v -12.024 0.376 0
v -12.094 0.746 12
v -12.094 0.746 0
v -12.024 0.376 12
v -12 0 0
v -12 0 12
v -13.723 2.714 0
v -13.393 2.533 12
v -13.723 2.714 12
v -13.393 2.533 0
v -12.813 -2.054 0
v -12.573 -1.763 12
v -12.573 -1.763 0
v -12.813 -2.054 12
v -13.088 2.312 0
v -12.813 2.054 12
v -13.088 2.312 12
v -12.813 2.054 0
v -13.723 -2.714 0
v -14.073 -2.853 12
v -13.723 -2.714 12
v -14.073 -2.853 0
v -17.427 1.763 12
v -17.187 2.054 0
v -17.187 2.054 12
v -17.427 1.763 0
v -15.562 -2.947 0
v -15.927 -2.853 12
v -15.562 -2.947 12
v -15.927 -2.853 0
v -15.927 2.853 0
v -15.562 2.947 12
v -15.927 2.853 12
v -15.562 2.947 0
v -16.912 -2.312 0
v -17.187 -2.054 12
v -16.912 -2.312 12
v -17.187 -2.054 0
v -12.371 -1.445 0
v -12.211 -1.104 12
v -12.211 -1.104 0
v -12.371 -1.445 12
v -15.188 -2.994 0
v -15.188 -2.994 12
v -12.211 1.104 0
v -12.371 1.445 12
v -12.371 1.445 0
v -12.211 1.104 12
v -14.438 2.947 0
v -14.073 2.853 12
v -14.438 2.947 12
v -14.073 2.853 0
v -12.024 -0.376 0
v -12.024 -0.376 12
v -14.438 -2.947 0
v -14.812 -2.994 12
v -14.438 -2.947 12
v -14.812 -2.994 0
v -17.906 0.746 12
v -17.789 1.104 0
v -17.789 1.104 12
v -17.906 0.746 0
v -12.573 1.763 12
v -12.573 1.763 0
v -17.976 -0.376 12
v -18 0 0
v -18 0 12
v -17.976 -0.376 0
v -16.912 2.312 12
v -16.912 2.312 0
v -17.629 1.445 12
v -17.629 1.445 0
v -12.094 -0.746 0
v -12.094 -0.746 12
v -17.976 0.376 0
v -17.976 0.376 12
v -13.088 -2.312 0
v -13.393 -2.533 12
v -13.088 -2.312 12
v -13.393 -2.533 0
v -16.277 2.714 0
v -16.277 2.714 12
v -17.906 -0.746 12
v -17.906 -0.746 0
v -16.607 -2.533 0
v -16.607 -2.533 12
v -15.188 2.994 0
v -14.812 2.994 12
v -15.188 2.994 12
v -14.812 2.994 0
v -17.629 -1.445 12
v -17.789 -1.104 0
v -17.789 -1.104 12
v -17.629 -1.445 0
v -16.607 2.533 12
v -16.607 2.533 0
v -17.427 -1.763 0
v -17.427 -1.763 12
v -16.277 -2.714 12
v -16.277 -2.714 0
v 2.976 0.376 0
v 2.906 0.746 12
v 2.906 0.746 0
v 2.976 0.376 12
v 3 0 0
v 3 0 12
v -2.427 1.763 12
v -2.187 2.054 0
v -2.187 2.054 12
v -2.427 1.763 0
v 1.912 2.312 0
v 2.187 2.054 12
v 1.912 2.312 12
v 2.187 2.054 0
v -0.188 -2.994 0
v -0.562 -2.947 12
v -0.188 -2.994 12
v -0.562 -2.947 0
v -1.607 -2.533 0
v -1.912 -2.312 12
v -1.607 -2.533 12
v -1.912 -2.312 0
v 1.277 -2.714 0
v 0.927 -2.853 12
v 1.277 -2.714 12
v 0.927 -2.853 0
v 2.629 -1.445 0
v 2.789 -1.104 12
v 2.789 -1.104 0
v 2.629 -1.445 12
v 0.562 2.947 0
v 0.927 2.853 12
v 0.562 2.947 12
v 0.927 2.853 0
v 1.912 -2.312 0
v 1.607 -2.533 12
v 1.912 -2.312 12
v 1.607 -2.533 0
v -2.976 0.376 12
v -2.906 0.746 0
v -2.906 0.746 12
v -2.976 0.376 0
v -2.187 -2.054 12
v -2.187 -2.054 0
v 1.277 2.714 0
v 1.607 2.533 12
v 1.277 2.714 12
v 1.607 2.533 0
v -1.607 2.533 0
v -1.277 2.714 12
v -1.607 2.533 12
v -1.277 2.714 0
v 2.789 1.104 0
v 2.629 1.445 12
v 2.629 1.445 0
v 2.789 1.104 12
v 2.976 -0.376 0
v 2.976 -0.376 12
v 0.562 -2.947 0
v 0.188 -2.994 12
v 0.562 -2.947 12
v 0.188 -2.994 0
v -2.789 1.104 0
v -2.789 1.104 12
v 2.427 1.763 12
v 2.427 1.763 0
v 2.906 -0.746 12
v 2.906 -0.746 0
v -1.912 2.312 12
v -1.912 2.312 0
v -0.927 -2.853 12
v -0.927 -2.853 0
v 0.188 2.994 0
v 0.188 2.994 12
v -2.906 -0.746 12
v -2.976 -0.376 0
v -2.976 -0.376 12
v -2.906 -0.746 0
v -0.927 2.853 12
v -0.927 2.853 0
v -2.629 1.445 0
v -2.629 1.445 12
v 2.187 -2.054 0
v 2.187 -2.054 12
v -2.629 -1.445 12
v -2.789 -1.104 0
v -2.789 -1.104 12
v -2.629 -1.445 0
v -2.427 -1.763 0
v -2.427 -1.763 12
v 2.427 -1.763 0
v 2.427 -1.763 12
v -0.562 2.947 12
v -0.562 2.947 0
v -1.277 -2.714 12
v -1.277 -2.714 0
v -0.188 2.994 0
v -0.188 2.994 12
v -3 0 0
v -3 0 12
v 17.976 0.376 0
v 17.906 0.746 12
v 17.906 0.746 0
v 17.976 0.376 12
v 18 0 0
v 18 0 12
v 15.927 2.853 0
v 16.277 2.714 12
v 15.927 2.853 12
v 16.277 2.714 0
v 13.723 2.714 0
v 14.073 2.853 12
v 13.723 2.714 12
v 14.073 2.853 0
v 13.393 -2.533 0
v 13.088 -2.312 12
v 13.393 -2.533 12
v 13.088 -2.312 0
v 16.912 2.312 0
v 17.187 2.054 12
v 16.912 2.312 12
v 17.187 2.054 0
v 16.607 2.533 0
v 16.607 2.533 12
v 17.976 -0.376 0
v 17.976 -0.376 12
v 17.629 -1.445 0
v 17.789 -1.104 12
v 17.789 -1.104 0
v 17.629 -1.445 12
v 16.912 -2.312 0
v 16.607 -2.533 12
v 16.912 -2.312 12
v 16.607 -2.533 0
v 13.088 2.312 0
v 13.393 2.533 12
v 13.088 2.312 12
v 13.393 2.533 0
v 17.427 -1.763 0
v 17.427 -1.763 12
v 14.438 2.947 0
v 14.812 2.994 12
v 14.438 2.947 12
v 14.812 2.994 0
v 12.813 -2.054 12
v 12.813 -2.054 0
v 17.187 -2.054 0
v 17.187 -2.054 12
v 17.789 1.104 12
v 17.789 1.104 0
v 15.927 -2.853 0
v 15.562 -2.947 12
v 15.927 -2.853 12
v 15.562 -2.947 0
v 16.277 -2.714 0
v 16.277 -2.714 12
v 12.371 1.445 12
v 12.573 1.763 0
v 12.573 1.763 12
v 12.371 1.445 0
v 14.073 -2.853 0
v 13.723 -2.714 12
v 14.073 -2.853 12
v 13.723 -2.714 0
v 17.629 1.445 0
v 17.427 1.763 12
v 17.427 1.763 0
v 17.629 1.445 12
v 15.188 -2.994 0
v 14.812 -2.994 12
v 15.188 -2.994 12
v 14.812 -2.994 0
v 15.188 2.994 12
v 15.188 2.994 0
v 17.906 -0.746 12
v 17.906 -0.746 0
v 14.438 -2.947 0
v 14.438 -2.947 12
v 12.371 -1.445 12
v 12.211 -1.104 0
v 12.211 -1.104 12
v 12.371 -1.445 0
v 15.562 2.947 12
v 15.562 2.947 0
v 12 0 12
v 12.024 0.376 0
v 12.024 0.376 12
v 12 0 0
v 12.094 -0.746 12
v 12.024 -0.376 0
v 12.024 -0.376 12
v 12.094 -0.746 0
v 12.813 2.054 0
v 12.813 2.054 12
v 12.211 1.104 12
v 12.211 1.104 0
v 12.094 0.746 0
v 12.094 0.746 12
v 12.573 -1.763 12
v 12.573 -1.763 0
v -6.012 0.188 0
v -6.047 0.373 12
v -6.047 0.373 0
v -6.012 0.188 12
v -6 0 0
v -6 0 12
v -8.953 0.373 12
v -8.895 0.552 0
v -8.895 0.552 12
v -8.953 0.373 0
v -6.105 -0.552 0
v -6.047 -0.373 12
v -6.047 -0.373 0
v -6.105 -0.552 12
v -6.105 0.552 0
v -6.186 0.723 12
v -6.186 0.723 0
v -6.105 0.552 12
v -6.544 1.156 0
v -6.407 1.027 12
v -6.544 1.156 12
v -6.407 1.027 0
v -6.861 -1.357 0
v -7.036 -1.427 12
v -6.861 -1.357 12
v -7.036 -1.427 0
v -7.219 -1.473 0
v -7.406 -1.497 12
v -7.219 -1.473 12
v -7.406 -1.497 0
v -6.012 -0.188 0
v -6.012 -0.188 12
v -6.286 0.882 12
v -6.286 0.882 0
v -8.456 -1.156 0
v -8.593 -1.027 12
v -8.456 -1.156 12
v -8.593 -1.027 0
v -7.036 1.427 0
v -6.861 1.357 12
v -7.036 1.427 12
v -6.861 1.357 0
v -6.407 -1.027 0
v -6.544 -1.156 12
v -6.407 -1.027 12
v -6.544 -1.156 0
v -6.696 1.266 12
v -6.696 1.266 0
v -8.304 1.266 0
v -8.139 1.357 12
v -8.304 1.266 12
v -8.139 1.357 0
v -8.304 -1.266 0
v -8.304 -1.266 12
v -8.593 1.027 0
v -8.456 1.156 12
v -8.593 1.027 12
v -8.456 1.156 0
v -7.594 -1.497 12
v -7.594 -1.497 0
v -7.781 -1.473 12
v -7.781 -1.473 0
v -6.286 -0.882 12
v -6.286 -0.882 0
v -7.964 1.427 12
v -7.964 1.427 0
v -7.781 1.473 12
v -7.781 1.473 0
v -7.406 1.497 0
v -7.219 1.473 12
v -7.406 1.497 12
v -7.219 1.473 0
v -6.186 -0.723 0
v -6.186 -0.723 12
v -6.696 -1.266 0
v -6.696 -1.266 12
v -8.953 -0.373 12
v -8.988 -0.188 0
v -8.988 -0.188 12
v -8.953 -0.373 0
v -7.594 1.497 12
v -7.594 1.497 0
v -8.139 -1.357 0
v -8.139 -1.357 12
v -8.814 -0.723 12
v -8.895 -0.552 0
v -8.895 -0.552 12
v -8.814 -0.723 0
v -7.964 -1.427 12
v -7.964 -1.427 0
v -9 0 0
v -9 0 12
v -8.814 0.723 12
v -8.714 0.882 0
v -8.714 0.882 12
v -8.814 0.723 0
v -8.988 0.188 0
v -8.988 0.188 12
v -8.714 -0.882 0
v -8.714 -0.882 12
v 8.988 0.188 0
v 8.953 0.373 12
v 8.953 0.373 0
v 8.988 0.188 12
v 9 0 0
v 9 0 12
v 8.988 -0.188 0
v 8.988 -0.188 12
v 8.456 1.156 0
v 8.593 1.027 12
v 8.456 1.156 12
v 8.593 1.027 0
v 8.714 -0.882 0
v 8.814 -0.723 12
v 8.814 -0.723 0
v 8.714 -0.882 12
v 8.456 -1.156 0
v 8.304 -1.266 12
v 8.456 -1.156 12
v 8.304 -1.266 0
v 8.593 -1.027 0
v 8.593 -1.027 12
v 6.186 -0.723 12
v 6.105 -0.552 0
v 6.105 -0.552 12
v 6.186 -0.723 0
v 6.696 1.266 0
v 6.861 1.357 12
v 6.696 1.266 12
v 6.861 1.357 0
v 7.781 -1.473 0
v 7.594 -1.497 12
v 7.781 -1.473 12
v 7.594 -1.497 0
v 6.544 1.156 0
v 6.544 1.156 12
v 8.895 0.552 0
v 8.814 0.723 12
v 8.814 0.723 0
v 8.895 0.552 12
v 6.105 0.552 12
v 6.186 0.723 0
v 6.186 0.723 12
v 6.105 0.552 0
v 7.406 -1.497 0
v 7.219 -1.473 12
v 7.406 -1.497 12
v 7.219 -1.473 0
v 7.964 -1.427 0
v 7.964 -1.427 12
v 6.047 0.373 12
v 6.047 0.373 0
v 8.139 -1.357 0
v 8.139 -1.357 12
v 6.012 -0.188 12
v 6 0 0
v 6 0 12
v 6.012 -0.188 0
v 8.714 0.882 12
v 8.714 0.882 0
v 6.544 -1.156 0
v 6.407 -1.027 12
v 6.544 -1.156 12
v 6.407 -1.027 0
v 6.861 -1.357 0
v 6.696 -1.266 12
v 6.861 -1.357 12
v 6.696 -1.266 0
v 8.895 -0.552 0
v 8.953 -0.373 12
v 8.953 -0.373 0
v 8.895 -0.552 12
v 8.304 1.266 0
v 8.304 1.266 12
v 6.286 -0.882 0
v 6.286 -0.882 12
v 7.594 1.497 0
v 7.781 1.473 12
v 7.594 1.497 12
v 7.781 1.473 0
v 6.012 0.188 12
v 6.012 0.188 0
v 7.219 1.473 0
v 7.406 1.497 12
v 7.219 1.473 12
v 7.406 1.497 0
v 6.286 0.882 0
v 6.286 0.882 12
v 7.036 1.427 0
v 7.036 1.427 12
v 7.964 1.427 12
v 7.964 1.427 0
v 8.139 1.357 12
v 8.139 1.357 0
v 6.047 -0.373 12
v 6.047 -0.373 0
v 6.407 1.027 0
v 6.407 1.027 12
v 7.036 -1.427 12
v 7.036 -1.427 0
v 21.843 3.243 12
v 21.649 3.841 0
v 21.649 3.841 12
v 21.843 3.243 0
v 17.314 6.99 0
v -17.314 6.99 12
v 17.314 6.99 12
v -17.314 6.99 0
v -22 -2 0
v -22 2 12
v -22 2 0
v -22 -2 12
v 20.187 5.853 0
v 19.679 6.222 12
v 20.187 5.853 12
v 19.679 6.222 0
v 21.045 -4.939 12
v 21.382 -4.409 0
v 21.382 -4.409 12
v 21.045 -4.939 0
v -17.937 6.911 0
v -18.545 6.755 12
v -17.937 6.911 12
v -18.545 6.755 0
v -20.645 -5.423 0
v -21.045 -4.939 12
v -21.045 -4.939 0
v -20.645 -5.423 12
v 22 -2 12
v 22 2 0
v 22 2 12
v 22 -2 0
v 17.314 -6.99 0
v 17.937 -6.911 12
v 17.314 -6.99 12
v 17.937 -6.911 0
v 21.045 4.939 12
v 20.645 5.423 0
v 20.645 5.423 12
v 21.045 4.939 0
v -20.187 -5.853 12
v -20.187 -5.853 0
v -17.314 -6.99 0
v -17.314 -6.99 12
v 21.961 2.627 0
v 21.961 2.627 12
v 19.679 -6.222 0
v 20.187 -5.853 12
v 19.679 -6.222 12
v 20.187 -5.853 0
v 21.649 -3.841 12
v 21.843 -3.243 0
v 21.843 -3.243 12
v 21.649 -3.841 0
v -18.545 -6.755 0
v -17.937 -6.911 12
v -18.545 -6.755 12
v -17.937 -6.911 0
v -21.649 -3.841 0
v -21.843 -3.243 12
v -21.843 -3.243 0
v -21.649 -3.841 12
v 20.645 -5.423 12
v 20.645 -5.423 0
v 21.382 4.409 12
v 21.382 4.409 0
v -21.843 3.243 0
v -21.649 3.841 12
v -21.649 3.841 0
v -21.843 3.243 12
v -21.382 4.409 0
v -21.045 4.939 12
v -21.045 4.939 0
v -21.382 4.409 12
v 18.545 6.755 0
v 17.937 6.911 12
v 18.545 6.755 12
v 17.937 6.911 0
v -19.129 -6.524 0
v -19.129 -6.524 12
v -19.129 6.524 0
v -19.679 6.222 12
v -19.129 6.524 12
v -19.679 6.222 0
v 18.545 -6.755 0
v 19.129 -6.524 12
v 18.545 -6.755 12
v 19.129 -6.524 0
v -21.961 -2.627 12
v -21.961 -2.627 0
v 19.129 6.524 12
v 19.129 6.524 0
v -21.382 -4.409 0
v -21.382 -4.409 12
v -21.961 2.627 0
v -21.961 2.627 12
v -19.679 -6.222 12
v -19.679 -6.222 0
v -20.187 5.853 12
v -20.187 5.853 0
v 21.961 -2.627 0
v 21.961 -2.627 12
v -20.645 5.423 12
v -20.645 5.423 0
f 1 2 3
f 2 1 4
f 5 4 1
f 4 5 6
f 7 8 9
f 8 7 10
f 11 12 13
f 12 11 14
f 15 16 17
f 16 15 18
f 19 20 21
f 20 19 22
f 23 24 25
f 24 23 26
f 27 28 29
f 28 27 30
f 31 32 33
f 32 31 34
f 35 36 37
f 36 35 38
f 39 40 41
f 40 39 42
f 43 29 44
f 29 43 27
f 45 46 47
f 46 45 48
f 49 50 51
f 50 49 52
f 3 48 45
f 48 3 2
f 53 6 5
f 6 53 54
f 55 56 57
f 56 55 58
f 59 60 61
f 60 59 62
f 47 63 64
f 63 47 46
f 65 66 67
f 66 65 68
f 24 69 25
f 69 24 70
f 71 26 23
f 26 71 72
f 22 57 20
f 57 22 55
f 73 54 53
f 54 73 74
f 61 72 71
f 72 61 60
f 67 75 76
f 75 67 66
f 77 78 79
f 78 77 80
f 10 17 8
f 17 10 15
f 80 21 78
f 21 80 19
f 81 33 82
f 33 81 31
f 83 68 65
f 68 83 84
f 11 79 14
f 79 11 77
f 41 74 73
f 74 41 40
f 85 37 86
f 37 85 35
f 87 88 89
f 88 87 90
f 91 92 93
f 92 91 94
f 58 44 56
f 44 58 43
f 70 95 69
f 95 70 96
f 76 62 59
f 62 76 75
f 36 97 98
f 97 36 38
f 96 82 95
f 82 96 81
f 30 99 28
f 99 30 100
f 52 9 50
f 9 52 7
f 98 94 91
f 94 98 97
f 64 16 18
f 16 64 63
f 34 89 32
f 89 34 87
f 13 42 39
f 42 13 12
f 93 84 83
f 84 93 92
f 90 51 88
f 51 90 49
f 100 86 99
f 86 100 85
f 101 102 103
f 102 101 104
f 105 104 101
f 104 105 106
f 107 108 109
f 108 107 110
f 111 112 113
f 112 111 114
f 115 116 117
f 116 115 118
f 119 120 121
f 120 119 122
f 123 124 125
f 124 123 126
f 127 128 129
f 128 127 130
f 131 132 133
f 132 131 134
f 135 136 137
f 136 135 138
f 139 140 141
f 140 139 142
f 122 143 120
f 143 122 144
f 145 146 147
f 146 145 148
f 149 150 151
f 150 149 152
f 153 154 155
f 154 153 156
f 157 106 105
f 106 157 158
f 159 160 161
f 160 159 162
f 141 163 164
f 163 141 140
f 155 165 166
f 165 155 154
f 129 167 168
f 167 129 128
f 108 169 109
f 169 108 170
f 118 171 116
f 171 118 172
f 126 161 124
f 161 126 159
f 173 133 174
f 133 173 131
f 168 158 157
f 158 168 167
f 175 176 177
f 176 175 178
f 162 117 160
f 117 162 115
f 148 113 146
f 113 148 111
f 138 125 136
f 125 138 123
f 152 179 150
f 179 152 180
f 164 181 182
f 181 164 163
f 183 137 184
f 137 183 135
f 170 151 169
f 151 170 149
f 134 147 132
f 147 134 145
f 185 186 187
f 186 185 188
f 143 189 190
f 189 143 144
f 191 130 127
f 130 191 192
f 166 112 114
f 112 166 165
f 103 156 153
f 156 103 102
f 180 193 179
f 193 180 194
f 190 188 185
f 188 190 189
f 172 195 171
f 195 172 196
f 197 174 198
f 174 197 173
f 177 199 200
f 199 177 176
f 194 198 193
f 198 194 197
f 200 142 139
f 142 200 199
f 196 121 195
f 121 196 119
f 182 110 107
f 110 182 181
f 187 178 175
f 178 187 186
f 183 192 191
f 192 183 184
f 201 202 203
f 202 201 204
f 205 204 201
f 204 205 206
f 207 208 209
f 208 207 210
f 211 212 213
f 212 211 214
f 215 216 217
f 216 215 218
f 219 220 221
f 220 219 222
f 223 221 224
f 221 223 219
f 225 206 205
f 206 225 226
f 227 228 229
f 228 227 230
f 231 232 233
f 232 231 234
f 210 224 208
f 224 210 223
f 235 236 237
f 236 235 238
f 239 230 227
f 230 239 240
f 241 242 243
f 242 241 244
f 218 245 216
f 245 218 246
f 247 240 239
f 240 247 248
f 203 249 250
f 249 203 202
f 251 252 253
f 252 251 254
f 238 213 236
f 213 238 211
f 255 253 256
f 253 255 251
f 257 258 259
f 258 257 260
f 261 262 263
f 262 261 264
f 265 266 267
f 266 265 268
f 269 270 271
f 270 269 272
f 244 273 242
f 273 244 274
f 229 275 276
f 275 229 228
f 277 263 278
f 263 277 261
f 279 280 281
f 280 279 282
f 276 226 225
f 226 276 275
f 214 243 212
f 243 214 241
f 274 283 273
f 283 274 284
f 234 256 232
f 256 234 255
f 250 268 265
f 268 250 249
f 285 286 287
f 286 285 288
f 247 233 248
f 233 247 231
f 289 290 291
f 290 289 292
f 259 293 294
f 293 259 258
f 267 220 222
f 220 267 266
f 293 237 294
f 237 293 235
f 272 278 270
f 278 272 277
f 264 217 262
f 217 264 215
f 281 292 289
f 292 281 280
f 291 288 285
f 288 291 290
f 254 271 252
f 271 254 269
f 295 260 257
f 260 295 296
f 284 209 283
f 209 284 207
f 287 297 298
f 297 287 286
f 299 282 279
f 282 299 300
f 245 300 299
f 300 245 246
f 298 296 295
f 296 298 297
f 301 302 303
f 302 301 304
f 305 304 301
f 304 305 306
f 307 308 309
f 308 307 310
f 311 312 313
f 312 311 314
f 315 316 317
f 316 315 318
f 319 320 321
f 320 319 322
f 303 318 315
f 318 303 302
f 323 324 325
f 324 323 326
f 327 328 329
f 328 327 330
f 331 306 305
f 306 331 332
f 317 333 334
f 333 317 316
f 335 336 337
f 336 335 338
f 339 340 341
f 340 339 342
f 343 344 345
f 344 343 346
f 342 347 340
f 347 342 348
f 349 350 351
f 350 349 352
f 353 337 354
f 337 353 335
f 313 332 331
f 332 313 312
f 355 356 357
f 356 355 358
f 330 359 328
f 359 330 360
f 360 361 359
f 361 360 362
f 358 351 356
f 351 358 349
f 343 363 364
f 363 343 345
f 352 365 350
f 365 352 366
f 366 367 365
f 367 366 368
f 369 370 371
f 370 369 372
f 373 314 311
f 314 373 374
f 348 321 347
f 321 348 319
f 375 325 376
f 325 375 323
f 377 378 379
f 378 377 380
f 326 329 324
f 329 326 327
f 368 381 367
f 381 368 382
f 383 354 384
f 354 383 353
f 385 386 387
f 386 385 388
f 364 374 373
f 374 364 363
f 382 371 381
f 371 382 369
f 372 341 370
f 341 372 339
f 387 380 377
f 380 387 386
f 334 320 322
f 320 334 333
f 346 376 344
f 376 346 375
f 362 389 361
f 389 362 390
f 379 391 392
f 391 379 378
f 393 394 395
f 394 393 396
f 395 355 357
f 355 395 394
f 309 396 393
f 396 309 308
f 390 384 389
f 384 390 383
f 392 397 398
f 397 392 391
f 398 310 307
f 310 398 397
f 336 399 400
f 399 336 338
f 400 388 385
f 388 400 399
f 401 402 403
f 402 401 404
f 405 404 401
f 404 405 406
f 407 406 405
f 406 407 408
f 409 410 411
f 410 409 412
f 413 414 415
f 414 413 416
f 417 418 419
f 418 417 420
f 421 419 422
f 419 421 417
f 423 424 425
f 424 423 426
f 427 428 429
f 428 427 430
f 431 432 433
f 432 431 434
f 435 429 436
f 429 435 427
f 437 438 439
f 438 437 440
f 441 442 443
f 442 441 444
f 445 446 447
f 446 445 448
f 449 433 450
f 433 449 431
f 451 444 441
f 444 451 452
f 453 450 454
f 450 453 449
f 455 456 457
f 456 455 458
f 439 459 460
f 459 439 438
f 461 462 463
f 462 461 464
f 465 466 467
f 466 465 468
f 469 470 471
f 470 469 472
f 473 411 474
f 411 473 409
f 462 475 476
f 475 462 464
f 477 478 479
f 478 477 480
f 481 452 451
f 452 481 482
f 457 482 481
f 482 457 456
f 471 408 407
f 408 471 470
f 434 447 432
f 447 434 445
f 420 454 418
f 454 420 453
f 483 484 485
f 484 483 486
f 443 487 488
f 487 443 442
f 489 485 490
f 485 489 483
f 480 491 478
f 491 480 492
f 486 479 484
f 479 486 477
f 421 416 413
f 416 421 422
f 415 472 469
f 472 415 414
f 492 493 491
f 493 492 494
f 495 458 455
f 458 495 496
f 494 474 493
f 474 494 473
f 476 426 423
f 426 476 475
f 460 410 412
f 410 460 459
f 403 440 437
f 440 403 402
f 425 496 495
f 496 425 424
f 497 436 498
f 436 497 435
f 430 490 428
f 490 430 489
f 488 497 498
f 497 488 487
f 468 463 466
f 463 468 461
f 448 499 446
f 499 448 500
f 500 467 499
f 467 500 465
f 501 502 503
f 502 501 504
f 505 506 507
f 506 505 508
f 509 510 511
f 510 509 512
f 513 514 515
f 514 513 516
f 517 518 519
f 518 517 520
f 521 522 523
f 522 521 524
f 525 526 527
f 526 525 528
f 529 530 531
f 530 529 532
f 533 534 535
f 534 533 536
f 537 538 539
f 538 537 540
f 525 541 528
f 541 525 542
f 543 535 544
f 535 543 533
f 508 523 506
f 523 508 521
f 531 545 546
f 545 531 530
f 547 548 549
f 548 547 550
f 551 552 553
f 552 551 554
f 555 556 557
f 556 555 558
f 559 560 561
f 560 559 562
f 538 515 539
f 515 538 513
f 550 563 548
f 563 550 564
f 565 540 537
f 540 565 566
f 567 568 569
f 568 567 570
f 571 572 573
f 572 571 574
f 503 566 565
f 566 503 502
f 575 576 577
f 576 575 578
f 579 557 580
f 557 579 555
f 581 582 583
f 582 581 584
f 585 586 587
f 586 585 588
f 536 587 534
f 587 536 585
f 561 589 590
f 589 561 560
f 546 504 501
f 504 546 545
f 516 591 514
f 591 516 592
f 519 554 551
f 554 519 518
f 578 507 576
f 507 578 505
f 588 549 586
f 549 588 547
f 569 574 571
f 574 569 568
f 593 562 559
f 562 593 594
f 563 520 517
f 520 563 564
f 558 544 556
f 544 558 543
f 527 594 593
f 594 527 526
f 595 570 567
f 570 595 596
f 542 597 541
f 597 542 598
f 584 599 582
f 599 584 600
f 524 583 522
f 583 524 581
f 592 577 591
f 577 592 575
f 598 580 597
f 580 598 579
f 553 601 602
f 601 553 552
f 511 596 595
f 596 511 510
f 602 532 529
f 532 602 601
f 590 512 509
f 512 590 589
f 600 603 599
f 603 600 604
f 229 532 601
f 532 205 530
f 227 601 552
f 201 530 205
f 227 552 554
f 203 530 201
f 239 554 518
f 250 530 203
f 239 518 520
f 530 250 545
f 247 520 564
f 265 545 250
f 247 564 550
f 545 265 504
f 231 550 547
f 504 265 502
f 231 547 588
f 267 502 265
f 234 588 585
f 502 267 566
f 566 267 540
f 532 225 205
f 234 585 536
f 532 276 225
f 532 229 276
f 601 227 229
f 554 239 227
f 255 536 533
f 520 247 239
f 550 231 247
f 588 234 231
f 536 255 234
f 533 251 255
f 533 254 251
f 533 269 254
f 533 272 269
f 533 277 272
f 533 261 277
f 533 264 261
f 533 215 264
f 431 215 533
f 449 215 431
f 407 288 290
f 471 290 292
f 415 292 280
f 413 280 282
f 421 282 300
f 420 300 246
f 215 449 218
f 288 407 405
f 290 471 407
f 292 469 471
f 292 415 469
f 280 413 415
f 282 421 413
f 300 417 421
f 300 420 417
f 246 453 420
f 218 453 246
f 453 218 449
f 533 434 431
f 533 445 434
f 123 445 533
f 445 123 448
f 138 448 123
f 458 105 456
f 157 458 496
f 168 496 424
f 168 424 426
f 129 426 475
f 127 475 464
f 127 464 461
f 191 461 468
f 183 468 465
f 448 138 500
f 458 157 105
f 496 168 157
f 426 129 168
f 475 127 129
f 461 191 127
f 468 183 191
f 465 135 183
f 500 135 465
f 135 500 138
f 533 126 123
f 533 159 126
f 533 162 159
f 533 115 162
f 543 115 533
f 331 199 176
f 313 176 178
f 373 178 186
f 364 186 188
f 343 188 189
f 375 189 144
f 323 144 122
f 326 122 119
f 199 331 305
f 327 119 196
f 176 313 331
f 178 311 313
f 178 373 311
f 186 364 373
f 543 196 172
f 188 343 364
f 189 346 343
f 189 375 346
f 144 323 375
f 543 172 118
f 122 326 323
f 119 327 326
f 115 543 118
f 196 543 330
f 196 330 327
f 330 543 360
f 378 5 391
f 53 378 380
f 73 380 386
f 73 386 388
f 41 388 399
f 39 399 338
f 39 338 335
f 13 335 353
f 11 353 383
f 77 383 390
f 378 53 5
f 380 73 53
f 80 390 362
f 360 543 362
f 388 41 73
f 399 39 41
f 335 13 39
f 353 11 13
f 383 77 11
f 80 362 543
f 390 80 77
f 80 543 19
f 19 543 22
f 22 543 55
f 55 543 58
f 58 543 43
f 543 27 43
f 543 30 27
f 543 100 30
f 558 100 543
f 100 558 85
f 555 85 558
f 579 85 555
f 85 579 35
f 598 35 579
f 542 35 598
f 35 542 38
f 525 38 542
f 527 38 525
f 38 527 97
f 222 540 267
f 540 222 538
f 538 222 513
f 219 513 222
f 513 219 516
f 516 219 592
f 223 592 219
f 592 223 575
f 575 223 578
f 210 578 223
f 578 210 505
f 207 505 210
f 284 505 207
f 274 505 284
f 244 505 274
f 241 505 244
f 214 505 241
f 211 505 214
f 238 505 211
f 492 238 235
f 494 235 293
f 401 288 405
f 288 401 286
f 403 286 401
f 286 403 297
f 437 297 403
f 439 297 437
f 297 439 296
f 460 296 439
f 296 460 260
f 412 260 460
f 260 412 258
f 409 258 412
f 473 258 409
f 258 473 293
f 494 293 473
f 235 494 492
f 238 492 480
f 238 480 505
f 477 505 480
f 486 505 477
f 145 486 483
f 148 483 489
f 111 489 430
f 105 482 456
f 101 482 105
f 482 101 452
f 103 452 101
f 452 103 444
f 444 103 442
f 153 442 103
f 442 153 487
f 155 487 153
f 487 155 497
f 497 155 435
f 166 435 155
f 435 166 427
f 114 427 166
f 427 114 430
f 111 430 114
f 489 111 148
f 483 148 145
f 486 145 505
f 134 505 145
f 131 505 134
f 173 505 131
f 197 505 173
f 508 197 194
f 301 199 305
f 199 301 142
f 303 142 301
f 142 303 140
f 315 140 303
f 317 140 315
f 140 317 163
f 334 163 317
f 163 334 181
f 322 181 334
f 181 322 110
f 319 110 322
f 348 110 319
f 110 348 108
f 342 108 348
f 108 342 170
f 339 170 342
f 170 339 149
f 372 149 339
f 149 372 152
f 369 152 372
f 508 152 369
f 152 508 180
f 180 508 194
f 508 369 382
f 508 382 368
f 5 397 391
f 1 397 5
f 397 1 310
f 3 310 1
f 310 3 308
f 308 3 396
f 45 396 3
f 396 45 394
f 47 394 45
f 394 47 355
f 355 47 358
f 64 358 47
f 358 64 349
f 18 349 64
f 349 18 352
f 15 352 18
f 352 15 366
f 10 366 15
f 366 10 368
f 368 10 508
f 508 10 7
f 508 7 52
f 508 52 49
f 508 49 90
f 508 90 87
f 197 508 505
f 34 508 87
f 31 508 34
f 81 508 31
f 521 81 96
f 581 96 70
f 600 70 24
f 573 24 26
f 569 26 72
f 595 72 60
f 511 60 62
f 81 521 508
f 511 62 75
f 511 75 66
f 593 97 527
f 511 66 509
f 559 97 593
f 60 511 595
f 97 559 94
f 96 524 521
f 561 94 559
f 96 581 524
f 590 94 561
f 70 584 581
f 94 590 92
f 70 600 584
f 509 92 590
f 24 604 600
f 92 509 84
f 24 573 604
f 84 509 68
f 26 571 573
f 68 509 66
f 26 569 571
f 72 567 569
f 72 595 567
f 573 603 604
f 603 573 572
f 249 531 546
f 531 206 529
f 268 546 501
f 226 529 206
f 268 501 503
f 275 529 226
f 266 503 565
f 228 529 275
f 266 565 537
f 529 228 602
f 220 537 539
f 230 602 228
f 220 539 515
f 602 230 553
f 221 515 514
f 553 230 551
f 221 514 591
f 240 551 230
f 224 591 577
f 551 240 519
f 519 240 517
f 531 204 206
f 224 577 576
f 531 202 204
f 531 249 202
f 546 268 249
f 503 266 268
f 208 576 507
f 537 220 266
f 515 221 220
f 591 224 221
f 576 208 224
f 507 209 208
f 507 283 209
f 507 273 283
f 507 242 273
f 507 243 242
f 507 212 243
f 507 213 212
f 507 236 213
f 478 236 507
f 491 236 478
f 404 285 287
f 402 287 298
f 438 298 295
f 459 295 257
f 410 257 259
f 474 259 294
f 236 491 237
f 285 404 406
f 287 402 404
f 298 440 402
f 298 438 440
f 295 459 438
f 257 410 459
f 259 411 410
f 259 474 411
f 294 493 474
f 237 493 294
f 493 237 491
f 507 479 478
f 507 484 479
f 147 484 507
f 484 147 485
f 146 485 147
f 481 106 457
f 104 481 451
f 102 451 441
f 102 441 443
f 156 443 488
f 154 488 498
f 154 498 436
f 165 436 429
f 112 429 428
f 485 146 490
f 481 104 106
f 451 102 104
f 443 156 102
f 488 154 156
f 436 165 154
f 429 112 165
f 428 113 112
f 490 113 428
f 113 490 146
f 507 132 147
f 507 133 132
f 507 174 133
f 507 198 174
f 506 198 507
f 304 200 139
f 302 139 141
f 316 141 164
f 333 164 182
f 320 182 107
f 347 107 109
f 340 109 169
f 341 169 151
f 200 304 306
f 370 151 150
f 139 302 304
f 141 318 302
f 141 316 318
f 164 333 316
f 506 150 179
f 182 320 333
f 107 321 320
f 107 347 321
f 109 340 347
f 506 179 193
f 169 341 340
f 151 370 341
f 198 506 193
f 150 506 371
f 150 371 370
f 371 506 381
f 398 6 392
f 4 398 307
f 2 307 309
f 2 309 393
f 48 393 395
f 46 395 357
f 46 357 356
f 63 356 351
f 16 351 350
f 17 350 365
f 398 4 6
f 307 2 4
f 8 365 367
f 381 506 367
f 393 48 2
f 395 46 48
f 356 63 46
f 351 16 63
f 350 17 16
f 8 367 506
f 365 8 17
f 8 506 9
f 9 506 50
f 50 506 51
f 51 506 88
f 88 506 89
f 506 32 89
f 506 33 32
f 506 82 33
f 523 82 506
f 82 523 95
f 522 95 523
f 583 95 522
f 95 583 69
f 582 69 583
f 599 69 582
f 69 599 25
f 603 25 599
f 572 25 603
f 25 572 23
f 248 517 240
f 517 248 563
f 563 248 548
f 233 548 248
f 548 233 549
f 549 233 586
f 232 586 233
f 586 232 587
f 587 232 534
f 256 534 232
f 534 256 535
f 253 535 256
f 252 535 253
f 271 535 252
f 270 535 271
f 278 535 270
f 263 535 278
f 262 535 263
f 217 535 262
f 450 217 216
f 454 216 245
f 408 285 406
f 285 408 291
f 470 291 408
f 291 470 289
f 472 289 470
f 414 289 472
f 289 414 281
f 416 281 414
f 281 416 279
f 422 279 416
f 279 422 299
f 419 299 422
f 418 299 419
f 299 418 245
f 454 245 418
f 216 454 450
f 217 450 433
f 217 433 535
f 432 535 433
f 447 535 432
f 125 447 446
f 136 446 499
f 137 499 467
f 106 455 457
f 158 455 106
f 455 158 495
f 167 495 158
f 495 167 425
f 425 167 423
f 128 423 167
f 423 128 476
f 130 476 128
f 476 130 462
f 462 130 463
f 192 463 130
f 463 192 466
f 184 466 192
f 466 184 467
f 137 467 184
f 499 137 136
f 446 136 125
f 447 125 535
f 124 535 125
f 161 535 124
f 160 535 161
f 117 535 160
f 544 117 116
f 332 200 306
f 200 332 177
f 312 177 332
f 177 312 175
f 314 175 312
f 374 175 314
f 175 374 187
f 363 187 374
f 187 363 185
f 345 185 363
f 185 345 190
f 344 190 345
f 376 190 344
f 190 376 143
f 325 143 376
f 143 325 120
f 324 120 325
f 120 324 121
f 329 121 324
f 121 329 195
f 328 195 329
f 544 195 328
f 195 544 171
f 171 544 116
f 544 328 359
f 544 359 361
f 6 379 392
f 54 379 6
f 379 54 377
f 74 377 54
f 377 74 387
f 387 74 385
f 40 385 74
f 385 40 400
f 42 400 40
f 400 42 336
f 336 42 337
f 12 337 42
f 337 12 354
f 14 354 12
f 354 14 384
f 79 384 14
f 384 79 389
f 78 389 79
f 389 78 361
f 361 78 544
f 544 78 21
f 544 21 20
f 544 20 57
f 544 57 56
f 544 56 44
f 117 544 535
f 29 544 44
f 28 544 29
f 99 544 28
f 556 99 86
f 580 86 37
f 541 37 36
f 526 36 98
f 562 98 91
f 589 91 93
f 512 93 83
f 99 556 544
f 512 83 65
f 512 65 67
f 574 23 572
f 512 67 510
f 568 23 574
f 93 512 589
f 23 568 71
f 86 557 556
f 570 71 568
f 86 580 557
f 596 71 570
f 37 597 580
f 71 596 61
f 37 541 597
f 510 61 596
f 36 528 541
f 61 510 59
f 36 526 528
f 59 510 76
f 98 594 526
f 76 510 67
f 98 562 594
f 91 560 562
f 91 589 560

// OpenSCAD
$fn = 50;


difference() {
	union() {
		hull() {
			translate(v = [-17.0000000000, 2.0000000000, 0]) {
				cylinder(h = 12, r = 5);
			}
			translate(v = [17.0000000000, 2.0000000000, 0]) {
				cylinder(h = 12, r = 5);
			}
			translate(v = [-17.0000000000, -2.0000000000, 0]) {
				cylinder(h = 12, r = 5);
			}
			translate(v = [17.0000000000, -2.0000000000, 0]) {
				cylinder(h = 12, r = 5);
			}
		}
	}
	union() {
		translate(v = [-15.0000000000, 0.0000000000, 0]) {
			translate(v = [0, 0, -100]) {
				cylinder(h = 200, r = 3.0000000000);
			}
		}
		translate(v = [0, 0, -100]) {
			cylinder(h = 200, r = 3.0000000000);
		}
		translate(v = [15.0000000000, 0.0000000000, 0]) {
			translate(v = [0, 0, -100]) {
				cylinder(h = 200, r = 3.0000000000);
			}
		}
		translate(v = [-15.0000000000, 0.0000000000, 0]) {
			translate(v = [0, 0, -100]) {
				cylinder(h = 200, r = 1.5000000000);
			}
		}
		translate(v = [-7.5000000000, 0.0000000000, 0]) {
			translate(v = [0, 0, -100]) {
				cylinder(h = 200, r = 1.5000000000);
			}
		}
		translate(v = [0, 0, -100]) {
			cylinder(h = 200, r = 1.5000000000);
		}
		translate(v = [7.5000000000, 0.0000000000, 0]) {
			translate(v = [0, 0, -100]) {
				cylinder(h = 200, r = 1.5000000000);
			}
		}
		translate(v = [15.0000000000, 0.0000000000, 0]) {
			translate(v = [0, 0, -100]) {
				cylinder(h = 200, r = 1.5000000000);
			}
		}
	}
}
